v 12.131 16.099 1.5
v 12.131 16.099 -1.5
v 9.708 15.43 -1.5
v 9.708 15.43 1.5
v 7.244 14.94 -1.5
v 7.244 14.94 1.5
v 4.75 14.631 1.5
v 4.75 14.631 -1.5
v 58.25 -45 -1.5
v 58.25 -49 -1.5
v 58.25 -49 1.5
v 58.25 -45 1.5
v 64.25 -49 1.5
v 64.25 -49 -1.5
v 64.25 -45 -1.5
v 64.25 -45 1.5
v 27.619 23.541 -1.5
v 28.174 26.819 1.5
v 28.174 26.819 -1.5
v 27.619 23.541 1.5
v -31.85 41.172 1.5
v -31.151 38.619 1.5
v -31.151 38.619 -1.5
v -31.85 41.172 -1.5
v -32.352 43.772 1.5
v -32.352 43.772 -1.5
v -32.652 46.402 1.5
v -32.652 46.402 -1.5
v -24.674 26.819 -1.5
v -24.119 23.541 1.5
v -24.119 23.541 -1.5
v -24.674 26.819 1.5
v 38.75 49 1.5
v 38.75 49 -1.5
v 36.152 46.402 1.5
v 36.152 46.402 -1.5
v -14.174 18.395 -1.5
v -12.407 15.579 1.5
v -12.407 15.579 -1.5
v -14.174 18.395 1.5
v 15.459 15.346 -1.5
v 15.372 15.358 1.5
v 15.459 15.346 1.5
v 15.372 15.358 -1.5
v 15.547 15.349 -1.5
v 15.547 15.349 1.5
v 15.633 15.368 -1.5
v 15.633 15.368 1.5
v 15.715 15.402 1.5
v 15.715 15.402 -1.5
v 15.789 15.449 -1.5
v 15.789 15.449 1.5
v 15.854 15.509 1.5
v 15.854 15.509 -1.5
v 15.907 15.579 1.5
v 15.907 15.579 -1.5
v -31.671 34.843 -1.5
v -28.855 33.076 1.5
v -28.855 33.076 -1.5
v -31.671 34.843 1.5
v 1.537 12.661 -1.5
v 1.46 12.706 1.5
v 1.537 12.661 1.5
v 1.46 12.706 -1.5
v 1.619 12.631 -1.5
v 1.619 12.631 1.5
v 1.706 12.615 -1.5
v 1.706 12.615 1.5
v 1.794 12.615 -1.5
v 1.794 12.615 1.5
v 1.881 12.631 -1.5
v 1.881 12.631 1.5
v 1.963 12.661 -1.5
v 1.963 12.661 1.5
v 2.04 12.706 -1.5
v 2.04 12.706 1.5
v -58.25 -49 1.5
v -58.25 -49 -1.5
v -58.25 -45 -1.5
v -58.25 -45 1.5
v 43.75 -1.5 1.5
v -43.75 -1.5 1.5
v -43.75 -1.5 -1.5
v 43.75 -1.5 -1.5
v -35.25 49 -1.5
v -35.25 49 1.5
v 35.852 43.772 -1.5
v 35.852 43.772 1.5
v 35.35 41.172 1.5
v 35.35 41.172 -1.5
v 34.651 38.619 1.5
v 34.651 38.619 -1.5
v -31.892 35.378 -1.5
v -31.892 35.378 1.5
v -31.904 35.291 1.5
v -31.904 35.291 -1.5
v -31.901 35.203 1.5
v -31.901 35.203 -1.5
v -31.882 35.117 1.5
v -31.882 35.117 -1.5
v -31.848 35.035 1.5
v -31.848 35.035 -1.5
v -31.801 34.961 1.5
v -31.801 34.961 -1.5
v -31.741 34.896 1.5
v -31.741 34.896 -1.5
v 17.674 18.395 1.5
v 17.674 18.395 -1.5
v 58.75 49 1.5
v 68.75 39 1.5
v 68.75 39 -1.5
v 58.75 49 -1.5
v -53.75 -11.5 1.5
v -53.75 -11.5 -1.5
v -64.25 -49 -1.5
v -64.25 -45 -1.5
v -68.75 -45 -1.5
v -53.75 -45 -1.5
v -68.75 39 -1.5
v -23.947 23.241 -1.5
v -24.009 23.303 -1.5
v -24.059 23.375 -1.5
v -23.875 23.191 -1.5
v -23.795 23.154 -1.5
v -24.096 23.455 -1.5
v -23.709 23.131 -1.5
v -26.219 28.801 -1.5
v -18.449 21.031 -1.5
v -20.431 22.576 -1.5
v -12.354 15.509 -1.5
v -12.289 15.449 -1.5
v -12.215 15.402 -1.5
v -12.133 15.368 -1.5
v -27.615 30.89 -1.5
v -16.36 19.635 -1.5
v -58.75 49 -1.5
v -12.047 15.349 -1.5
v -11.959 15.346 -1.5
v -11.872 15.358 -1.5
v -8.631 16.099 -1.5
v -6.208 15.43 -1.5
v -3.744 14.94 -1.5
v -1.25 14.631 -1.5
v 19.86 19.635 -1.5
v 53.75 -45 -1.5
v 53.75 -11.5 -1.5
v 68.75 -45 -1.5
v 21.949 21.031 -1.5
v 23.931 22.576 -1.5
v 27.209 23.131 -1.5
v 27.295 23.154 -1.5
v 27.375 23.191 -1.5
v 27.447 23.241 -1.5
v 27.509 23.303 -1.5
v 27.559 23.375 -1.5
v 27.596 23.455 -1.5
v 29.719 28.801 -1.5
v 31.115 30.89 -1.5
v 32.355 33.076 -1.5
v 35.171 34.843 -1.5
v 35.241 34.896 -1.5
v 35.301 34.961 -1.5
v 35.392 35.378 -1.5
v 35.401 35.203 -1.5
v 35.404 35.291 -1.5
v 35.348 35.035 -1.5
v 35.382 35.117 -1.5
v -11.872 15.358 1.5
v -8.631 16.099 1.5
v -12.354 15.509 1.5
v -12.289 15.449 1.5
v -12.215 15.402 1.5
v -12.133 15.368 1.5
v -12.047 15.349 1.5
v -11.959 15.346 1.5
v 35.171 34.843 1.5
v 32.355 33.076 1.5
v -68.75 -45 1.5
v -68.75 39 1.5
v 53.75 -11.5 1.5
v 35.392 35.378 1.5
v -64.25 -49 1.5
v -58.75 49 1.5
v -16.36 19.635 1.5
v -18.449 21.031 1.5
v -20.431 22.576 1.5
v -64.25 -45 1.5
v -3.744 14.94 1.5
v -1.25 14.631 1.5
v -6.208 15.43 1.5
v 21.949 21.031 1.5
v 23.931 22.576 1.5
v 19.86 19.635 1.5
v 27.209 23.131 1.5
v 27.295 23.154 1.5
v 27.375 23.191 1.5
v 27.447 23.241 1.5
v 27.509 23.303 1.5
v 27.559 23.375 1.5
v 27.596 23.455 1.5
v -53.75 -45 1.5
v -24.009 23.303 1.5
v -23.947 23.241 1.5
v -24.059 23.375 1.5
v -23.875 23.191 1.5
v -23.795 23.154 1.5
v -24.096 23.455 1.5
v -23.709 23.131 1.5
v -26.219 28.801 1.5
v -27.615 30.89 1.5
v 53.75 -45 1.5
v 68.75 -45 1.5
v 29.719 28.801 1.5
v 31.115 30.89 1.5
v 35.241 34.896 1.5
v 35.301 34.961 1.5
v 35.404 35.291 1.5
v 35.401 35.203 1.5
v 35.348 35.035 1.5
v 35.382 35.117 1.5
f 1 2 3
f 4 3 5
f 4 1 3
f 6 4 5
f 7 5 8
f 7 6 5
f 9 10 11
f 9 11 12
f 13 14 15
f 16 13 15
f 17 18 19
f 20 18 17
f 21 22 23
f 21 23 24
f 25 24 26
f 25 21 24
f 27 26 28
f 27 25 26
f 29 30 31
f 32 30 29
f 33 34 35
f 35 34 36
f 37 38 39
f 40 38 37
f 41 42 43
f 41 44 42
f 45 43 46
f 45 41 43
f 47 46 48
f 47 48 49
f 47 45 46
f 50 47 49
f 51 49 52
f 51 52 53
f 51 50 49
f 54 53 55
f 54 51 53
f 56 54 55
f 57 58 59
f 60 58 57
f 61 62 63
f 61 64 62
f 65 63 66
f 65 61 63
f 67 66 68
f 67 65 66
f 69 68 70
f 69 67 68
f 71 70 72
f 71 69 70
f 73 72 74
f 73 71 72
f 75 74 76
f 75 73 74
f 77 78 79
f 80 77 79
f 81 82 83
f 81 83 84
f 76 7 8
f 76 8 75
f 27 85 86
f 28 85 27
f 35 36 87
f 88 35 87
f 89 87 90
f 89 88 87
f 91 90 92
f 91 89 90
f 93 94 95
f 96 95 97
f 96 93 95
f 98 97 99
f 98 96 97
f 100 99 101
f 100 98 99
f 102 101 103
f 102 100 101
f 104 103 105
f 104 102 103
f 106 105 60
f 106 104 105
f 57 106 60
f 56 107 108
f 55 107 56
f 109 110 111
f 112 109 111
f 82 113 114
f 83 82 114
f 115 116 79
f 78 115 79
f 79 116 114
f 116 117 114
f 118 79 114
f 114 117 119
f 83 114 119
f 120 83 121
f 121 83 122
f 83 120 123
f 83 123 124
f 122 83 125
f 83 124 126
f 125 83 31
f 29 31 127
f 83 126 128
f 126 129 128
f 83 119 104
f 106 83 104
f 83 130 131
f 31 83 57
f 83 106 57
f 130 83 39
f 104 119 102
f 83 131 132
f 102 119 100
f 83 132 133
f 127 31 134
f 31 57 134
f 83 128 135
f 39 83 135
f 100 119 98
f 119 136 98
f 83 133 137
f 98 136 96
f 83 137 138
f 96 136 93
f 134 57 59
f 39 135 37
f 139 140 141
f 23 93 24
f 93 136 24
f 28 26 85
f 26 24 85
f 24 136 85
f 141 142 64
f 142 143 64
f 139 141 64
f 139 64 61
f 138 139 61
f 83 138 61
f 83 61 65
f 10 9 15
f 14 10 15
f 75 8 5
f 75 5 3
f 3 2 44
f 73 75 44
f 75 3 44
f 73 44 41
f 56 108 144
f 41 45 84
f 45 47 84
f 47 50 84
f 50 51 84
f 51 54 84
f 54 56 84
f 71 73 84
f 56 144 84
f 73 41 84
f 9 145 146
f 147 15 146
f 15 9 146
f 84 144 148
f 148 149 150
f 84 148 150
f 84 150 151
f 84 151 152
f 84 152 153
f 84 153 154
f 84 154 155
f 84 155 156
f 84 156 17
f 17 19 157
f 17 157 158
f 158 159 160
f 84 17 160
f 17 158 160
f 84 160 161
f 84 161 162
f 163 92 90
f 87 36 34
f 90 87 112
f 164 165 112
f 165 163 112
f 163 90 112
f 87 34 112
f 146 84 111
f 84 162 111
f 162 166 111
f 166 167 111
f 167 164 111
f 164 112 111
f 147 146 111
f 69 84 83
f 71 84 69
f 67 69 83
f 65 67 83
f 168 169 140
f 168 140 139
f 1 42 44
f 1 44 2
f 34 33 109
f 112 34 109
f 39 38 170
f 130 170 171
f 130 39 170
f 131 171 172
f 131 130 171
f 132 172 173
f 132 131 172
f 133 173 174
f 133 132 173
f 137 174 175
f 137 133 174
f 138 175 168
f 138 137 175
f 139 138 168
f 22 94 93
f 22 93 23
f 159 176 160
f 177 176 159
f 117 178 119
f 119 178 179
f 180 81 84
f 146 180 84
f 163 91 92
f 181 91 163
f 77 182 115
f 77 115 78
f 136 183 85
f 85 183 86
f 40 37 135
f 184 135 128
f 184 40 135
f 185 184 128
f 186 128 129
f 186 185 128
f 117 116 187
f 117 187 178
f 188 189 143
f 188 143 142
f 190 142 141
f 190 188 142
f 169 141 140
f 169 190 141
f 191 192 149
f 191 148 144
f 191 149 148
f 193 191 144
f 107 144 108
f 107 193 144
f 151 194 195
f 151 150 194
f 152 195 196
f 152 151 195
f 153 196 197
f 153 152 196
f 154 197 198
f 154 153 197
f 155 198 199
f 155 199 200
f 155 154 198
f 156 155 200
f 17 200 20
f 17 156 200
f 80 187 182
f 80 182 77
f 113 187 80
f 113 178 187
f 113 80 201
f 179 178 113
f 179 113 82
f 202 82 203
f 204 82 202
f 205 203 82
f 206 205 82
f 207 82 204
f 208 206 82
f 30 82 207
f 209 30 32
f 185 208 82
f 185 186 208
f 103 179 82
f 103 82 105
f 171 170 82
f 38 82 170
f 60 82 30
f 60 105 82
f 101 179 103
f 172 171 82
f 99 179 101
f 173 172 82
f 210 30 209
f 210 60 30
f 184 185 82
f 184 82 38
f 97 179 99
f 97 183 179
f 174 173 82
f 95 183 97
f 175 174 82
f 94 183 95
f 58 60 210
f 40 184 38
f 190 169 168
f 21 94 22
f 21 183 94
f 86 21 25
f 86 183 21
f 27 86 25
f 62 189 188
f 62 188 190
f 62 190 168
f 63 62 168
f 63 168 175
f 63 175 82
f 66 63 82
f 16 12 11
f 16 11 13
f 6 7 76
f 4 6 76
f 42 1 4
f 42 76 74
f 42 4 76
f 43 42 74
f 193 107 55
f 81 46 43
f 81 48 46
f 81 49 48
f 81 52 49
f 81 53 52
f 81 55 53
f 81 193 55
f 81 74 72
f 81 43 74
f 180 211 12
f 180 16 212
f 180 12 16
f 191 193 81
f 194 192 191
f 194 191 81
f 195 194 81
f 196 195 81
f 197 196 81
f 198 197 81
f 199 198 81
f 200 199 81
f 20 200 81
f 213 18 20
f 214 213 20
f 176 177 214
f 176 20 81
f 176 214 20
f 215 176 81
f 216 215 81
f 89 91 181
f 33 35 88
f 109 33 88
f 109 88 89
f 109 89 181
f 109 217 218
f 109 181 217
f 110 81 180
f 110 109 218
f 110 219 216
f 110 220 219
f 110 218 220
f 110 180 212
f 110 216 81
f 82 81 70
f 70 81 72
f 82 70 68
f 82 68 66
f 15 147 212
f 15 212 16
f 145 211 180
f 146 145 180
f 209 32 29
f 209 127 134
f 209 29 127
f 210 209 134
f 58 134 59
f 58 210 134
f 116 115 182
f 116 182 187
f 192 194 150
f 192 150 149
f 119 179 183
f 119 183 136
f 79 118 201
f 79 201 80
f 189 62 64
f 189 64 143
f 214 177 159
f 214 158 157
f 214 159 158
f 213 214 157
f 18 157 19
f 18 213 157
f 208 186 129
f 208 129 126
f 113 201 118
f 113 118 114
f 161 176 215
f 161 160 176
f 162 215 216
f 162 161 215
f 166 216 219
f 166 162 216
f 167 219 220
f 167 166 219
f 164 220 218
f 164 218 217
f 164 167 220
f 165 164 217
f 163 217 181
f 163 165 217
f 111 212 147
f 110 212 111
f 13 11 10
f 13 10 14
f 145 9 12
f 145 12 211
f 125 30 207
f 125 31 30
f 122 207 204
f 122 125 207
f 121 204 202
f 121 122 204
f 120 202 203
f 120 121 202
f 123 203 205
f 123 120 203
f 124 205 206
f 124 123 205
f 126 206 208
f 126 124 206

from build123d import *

# Parameters (mm, degrees)
SKETCH1_W           = 137.5
SKETCH1_H           = 98
BOSS_EXTRUDE1_DEPTH = 1.5
SKETCH2_R           = 34
SKETCH2_W           = 107.5
SKETCH2_H           = 47.5
CUT_EXTRUDE1_DEPTH  = 85.478177656
CUT_EXTRUDE3_DEPTH  = 85.478177656
FILLET1_R           = 0.5
SKETCH22_W          = 4.5
SKETCH22_H          = 4
CUT_EXTRUDE5_DEPTH  = 85.478177656
CHAMFER1_SIZE       = 10
CHAMFER2_SIZE       = 2.5


with BuildPart() as part:
    # Sketch1 → Boss-Extrude1 (new, symmetric)
    with BuildSketch(Plane.XY):
        Rectangle(SKETCH1_W, SKETCH1_H)
    extrude(amount=BOSS_EXTRUDE1_DEPTH, both=True)

    # Sketch2 → Cut-Extrude1 (cut, through all)
    with BuildSketch(Plane.XY.offset(1.5)):
        with Locations((1.75, 49)):
            Circle(SKETCH2_R)
        with Locations((0, -25.25)):
            Rectangle(SKETCH2_W, SKETCH2_H)
    extrude(amount=-CUT_EXTRUDE1_DEPTH, mode=Mode.SUBTRACT)

    # Sketch17 → Cut-Extrude3 (cut, through all)
    with BuildSketch(Plane.XY.offset(1.5)):
        with BuildLine():
            Line((1.75, 12.5), (-1.25, 14.630682288))
            ThreePointArc((-1.25, 14.630682288), (-4.98061611, 15.162907826), (-8.630929873, 16.098840522))
            Line((-8.630929873, 16.098840522), (-12.217945281, 15.278397063))
            Line((-12.217945281, 15.278397063), (-14.174207068, 18.394941116))
            ThreePointArc((-14.174207068, 18.394941116), (-17.417173039, 20.314298376), (-20.431457275, 22.575902037))
            Line((-20.431457275, 22.575902037), (-24.059397513, 23.190602487))
            Line((-24.059397513, 23.190602487), (-24.674097963, 26.818542725))
            ThreePointArc((-24.674097963, 26.818542725), (-26.935701624, 29.832826961), (-28.855058884, 33.075792932))
            Line((-28.855058884, 33.075792932), (-31.971602937, 35.032054719))
            Line((-31.971602937, 35.032054719), (-31.151159478, 38.619070127))
            ThreePointArc((-31.151159478, 38.619070127), (1.75, 83.5), (34.651159478, 38.619070127))
            Line((34.651159478, 38.619070127), (35.471602937, 35.032054719))
            Line((35.471602937, 35.032054719), (32.355058884, 33.075792932))
            ThreePointArc((32.355058884, 33.075792932), (30.435701624, 29.832826961), (28.174097963, 26.818542725))
            Line((28.174097963, 26.818542725), (27.559397513, 23.190602487))
            Line((27.559397513, 23.190602487), (23.931457275, 22.575902037))
            ThreePointArc((23.931457275, 22.575902037), (20.917173039, 20.314298376), (17.674207068, 18.394941116))
            Line((17.674207068, 18.394941116), (15.717945281, 15.278397063))
            Line((15.717945281, 15.278397063), (12.130929873, 16.098840522))
            ThreePointArc((12.130929873, 16.098840522), (8.48061611, 15.162907826), (4.75, 14.630682288))
            Line((4.75, 14.630682288), (1.75, 12.5))
        make_face()
    extrude(amount=-CUT_EXTRUDE3_DEPTH, mode=Mode.SUBTRACT)

    # Fillet1
    fillet1_edges = [part.edges().sort_by_distance(p)[0] for p in [
        (15.717945281, 15.278397063, 0),
        (1.75, 12.5, 0),
        (-12.217945281, 15.278397063, 0),
        (-24.059397513, 23.190602487, 0),
        (-31.971602937, 35.032054719, 0),
        (35.471602937, 35.032054719, 0),
        (27.559397513, 23.190602487, 0),
    ]]
    fillet(fillet1_edges, radius=FILLET1_R)

    # Sketch22 → Cut-Extrude5 (cut, through all)
    with BuildSketch(Plane(origin=(0, 0, -1.5), x_dir=(-1, 0, 0), z_dir=(0, 0, -1))):
        with Locations((-66.5, -47)):
            Rectangle(SKETCH22_W, SKETCH22_H)
        with Locations((66.5, -47)):
            Rectangle(SKETCH22_W, SKETCH22_H)
        with Locations((56, -47)):
            Rectangle(SKETCH22_W, SKETCH22_H)
        with Locations((-56, -47)):
            Rectangle(SKETCH22_W, SKETCH22_H)
    extrude(amount=-CUT_EXTRUDE5_DEPTH, mode=Mode.SUBTRACT)

    # Chamfer1
    chamfer1_edges = [part.edges().sort_by_distance(p)[0] for p in [
        (-53.75, -1.5, 0),
        (53.75, -1.5, 0),
        (-68.75, 49, 0),
        (68.75, 49, 0),
    ]]
    chamfer(chamfer1_edges, length=CHAMFER1_SIZE)

    # Chamfer2
    # the kernel refuses this chamfer: 2.5 mm, written as the material it takes off along each edge
    with BuildSketch(Plane(origin=(36.25, 49, -8.184978913), x_dir=(1, 0, 0), z_dir=(0, 0, 1))) as chamfer2_piece_1:
        with BuildLine():
            Line((CHAMFER2_SIZE, 0), (-0.097956106, -2.597956106))
            ThreePointArc((-0.097956106, -2.597956106), (-0.025900977, -1.336598881), (0, 0))
            Line((0, 0), (CHAMFER2_SIZE, 0))
        make_face()
    extrude(amount=16.369957825, mode=Mode.SUBTRACT)
    with BuildSketch(Plane(origin=(-32.75, 49, -8.184978913), x_dir=(-1, 0, 0), z_dir=(0, 0, 1))) as chamfer2_piece_2:
        with BuildLine():
            Line((CHAMFER2_SIZE, 0), (-0.097956106, 2.597956106))
            ThreePointArc((-0.097956106, 2.597956106), (-0.025900977, 1.336598881), (0, 0))
            Line((0, 0), (CHAMFER2_SIZE, 0))
        make_face()
    extrude(amount=16.369957825, mode=Mode.SUBTRACT)


solid = part.part
